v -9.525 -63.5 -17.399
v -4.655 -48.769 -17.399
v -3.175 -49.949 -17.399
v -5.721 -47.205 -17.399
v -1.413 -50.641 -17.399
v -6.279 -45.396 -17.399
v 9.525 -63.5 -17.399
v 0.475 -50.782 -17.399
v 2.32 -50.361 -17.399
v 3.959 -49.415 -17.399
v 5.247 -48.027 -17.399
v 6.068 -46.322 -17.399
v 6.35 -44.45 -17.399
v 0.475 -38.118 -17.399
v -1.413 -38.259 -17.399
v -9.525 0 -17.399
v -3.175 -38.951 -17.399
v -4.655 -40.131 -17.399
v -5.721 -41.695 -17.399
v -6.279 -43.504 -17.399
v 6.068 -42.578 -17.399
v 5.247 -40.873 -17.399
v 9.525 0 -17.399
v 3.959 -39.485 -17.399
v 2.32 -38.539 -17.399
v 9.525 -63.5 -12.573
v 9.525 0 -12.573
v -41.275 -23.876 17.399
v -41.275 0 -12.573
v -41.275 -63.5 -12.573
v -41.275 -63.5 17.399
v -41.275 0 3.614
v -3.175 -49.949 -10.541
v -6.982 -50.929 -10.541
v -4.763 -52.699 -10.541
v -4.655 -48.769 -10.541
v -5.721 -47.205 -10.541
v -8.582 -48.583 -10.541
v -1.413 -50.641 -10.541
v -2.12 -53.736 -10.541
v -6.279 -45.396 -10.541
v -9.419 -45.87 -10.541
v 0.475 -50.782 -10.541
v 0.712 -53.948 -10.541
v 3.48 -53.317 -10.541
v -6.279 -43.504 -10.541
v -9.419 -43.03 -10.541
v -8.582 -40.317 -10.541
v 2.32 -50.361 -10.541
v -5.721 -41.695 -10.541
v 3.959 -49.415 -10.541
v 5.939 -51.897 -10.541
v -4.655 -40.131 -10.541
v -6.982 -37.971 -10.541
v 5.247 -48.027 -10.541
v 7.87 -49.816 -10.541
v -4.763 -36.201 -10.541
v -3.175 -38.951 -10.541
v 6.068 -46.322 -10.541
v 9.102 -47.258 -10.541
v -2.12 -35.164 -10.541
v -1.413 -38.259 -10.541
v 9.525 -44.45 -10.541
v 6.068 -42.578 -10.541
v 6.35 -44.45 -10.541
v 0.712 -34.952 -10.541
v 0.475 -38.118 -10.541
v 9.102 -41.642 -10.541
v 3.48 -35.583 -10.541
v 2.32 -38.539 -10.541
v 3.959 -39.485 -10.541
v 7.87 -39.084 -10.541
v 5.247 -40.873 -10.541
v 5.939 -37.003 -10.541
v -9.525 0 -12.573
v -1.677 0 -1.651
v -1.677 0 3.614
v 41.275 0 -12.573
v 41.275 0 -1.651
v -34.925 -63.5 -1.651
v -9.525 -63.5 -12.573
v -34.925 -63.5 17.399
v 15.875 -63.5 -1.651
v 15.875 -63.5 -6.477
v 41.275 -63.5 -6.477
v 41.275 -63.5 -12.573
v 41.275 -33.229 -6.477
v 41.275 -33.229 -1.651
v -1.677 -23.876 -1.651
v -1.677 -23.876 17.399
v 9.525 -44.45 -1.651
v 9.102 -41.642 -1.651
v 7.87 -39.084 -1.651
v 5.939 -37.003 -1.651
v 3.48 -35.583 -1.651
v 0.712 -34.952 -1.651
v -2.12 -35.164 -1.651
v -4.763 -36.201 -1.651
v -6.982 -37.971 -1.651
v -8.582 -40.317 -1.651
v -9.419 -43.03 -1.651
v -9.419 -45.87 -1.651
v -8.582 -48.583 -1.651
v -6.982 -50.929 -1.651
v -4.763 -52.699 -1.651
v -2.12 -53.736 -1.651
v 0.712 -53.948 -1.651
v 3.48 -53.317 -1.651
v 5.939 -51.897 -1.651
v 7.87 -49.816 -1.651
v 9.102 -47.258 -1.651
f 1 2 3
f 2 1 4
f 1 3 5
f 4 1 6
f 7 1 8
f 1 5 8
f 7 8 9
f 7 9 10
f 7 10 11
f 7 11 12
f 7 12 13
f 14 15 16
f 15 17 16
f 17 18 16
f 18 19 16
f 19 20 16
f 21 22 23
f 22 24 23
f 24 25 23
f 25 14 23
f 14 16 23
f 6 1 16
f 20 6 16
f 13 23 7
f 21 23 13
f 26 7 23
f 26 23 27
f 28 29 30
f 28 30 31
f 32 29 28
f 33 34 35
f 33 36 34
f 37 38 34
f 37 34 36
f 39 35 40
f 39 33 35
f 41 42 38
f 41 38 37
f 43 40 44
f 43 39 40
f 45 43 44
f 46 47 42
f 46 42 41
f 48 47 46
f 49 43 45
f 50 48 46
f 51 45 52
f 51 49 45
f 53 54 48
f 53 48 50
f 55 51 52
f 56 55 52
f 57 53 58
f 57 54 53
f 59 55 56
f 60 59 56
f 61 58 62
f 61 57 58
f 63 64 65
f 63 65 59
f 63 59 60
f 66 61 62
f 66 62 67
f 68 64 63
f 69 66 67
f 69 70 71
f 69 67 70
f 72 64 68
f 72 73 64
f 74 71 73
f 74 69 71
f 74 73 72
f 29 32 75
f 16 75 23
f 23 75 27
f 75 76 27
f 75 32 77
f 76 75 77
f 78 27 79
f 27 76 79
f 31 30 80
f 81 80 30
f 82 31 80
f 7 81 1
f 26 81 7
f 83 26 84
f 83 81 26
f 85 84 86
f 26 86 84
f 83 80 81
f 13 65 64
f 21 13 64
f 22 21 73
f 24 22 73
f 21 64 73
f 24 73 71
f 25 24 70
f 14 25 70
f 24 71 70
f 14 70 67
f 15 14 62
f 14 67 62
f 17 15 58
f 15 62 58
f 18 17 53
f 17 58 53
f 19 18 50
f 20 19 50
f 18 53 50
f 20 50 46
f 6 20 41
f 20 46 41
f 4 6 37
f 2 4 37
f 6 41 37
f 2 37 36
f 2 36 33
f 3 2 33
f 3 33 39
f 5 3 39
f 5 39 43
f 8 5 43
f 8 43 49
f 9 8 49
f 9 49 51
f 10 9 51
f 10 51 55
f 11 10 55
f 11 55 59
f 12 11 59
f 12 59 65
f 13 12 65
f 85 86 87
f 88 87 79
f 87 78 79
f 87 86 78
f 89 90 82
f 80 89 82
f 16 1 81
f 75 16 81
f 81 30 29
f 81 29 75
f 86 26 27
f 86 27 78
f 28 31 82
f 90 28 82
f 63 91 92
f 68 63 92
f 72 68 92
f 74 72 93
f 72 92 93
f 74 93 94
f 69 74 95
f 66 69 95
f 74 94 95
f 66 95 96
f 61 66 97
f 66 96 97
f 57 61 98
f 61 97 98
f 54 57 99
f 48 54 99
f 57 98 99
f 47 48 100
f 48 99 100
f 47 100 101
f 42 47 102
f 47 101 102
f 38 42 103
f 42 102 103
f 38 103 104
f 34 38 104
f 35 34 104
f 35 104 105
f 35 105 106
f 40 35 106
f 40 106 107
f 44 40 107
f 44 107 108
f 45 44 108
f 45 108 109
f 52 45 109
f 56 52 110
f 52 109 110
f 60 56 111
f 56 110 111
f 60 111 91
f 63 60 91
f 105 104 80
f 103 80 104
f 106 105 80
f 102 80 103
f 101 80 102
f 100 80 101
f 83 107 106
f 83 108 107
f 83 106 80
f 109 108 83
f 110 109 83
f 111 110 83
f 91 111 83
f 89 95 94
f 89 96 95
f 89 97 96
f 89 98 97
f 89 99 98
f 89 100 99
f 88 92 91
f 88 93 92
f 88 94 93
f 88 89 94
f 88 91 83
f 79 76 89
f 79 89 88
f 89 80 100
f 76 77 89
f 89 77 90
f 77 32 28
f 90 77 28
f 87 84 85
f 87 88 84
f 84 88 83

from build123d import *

# Parameters (mm, degrees)
F0_W      = 82.55
F0_H      = 34.798
F1_DEPTH  = 63.5
F2_W      = 31.75
F2_H      = 4.826
F3_DEPTH  = 63.501
F5_DEPTH  = 19.05
F7_DEPTH  = 82.551
F9_DEPTH  = 4.826
F10_R     = 6.35
F11_DEPTH = 15.749
F12_R     = 9.525
F13_DEPTH = 8.89


with BuildPart() as f1:
    # F0 (on Front) → F1 (new body)
    with BuildSketch(Plane.XZ):
        Rectangle(F0_W, F0_H)
    extrude(amount=F1_DEPTH)

    # F2 (on face) → F3 (cut, through all)
    with BuildSketch(Plane.XZ.offset(63.5)):
        with Locations((-25.4, -14.986)):
            Rectangle(F2_W, F2_H)
        with Locations((25.4, -14.986)):
            Rectangle(F2_W, F2_H)
    extrude(amount=-F3_DEPTH, mode=Mode.SUBTRACT)

    # F4 (on face) → F5 (cut)
    with BuildSketch(Plane.XY.offset(17.399)):
        Polygon((-1.676516, -23.876), (-34.925, -63.5), (41.275, -63.5), (41.275, 0), (-1.676516, 0), align=None)
    extrude(amount=-F5_DEPTH, mode=Mode.SUBTRACT)

    # F6 (on face) → F7 (cut, through all)
    with BuildSketch(Plane(origin=(-41.275, 0, 0), x_dir=(0, -1, 0), z_dir=(-1, 0, 0))):
        Polygon((0, 17.399), (0, 3.614185), (23.876, 17.399), align=None)
    extrude(amount=-F7_DEPTH, mode=Mode.SUBTRACT)

    # F8 (on face) → F9 (cut)
    with BuildSketch(Plane.XY.offset(-1.651)):
        Polygon((15.875, -63.5), (41.275, -63.5), (41.275, -33.229459), align=None)
    extrude(amount=-F9_DEPTH, mode=Mode.SUBTRACT)

    # F10 (on face) → F11 (cut, through all)
    with BuildSketch(Plane.XY.offset(-1.651)):
        with Locations((0, -44.45)):
            Circle(F10_R)
    extrude(amount=-F11_DEPTH, mode=Mode.SUBTRACT)

    # F12 (on face) → F13 (cut)
    with BuildSketch(Plane.XY.offset(-1.651)):
        with Locations((0, -44.45)):
            Circle(F12_R)
    extrude(amount=-F13_DEPTH, mode=Mode.SUBTRACT)


solid = f1.part
